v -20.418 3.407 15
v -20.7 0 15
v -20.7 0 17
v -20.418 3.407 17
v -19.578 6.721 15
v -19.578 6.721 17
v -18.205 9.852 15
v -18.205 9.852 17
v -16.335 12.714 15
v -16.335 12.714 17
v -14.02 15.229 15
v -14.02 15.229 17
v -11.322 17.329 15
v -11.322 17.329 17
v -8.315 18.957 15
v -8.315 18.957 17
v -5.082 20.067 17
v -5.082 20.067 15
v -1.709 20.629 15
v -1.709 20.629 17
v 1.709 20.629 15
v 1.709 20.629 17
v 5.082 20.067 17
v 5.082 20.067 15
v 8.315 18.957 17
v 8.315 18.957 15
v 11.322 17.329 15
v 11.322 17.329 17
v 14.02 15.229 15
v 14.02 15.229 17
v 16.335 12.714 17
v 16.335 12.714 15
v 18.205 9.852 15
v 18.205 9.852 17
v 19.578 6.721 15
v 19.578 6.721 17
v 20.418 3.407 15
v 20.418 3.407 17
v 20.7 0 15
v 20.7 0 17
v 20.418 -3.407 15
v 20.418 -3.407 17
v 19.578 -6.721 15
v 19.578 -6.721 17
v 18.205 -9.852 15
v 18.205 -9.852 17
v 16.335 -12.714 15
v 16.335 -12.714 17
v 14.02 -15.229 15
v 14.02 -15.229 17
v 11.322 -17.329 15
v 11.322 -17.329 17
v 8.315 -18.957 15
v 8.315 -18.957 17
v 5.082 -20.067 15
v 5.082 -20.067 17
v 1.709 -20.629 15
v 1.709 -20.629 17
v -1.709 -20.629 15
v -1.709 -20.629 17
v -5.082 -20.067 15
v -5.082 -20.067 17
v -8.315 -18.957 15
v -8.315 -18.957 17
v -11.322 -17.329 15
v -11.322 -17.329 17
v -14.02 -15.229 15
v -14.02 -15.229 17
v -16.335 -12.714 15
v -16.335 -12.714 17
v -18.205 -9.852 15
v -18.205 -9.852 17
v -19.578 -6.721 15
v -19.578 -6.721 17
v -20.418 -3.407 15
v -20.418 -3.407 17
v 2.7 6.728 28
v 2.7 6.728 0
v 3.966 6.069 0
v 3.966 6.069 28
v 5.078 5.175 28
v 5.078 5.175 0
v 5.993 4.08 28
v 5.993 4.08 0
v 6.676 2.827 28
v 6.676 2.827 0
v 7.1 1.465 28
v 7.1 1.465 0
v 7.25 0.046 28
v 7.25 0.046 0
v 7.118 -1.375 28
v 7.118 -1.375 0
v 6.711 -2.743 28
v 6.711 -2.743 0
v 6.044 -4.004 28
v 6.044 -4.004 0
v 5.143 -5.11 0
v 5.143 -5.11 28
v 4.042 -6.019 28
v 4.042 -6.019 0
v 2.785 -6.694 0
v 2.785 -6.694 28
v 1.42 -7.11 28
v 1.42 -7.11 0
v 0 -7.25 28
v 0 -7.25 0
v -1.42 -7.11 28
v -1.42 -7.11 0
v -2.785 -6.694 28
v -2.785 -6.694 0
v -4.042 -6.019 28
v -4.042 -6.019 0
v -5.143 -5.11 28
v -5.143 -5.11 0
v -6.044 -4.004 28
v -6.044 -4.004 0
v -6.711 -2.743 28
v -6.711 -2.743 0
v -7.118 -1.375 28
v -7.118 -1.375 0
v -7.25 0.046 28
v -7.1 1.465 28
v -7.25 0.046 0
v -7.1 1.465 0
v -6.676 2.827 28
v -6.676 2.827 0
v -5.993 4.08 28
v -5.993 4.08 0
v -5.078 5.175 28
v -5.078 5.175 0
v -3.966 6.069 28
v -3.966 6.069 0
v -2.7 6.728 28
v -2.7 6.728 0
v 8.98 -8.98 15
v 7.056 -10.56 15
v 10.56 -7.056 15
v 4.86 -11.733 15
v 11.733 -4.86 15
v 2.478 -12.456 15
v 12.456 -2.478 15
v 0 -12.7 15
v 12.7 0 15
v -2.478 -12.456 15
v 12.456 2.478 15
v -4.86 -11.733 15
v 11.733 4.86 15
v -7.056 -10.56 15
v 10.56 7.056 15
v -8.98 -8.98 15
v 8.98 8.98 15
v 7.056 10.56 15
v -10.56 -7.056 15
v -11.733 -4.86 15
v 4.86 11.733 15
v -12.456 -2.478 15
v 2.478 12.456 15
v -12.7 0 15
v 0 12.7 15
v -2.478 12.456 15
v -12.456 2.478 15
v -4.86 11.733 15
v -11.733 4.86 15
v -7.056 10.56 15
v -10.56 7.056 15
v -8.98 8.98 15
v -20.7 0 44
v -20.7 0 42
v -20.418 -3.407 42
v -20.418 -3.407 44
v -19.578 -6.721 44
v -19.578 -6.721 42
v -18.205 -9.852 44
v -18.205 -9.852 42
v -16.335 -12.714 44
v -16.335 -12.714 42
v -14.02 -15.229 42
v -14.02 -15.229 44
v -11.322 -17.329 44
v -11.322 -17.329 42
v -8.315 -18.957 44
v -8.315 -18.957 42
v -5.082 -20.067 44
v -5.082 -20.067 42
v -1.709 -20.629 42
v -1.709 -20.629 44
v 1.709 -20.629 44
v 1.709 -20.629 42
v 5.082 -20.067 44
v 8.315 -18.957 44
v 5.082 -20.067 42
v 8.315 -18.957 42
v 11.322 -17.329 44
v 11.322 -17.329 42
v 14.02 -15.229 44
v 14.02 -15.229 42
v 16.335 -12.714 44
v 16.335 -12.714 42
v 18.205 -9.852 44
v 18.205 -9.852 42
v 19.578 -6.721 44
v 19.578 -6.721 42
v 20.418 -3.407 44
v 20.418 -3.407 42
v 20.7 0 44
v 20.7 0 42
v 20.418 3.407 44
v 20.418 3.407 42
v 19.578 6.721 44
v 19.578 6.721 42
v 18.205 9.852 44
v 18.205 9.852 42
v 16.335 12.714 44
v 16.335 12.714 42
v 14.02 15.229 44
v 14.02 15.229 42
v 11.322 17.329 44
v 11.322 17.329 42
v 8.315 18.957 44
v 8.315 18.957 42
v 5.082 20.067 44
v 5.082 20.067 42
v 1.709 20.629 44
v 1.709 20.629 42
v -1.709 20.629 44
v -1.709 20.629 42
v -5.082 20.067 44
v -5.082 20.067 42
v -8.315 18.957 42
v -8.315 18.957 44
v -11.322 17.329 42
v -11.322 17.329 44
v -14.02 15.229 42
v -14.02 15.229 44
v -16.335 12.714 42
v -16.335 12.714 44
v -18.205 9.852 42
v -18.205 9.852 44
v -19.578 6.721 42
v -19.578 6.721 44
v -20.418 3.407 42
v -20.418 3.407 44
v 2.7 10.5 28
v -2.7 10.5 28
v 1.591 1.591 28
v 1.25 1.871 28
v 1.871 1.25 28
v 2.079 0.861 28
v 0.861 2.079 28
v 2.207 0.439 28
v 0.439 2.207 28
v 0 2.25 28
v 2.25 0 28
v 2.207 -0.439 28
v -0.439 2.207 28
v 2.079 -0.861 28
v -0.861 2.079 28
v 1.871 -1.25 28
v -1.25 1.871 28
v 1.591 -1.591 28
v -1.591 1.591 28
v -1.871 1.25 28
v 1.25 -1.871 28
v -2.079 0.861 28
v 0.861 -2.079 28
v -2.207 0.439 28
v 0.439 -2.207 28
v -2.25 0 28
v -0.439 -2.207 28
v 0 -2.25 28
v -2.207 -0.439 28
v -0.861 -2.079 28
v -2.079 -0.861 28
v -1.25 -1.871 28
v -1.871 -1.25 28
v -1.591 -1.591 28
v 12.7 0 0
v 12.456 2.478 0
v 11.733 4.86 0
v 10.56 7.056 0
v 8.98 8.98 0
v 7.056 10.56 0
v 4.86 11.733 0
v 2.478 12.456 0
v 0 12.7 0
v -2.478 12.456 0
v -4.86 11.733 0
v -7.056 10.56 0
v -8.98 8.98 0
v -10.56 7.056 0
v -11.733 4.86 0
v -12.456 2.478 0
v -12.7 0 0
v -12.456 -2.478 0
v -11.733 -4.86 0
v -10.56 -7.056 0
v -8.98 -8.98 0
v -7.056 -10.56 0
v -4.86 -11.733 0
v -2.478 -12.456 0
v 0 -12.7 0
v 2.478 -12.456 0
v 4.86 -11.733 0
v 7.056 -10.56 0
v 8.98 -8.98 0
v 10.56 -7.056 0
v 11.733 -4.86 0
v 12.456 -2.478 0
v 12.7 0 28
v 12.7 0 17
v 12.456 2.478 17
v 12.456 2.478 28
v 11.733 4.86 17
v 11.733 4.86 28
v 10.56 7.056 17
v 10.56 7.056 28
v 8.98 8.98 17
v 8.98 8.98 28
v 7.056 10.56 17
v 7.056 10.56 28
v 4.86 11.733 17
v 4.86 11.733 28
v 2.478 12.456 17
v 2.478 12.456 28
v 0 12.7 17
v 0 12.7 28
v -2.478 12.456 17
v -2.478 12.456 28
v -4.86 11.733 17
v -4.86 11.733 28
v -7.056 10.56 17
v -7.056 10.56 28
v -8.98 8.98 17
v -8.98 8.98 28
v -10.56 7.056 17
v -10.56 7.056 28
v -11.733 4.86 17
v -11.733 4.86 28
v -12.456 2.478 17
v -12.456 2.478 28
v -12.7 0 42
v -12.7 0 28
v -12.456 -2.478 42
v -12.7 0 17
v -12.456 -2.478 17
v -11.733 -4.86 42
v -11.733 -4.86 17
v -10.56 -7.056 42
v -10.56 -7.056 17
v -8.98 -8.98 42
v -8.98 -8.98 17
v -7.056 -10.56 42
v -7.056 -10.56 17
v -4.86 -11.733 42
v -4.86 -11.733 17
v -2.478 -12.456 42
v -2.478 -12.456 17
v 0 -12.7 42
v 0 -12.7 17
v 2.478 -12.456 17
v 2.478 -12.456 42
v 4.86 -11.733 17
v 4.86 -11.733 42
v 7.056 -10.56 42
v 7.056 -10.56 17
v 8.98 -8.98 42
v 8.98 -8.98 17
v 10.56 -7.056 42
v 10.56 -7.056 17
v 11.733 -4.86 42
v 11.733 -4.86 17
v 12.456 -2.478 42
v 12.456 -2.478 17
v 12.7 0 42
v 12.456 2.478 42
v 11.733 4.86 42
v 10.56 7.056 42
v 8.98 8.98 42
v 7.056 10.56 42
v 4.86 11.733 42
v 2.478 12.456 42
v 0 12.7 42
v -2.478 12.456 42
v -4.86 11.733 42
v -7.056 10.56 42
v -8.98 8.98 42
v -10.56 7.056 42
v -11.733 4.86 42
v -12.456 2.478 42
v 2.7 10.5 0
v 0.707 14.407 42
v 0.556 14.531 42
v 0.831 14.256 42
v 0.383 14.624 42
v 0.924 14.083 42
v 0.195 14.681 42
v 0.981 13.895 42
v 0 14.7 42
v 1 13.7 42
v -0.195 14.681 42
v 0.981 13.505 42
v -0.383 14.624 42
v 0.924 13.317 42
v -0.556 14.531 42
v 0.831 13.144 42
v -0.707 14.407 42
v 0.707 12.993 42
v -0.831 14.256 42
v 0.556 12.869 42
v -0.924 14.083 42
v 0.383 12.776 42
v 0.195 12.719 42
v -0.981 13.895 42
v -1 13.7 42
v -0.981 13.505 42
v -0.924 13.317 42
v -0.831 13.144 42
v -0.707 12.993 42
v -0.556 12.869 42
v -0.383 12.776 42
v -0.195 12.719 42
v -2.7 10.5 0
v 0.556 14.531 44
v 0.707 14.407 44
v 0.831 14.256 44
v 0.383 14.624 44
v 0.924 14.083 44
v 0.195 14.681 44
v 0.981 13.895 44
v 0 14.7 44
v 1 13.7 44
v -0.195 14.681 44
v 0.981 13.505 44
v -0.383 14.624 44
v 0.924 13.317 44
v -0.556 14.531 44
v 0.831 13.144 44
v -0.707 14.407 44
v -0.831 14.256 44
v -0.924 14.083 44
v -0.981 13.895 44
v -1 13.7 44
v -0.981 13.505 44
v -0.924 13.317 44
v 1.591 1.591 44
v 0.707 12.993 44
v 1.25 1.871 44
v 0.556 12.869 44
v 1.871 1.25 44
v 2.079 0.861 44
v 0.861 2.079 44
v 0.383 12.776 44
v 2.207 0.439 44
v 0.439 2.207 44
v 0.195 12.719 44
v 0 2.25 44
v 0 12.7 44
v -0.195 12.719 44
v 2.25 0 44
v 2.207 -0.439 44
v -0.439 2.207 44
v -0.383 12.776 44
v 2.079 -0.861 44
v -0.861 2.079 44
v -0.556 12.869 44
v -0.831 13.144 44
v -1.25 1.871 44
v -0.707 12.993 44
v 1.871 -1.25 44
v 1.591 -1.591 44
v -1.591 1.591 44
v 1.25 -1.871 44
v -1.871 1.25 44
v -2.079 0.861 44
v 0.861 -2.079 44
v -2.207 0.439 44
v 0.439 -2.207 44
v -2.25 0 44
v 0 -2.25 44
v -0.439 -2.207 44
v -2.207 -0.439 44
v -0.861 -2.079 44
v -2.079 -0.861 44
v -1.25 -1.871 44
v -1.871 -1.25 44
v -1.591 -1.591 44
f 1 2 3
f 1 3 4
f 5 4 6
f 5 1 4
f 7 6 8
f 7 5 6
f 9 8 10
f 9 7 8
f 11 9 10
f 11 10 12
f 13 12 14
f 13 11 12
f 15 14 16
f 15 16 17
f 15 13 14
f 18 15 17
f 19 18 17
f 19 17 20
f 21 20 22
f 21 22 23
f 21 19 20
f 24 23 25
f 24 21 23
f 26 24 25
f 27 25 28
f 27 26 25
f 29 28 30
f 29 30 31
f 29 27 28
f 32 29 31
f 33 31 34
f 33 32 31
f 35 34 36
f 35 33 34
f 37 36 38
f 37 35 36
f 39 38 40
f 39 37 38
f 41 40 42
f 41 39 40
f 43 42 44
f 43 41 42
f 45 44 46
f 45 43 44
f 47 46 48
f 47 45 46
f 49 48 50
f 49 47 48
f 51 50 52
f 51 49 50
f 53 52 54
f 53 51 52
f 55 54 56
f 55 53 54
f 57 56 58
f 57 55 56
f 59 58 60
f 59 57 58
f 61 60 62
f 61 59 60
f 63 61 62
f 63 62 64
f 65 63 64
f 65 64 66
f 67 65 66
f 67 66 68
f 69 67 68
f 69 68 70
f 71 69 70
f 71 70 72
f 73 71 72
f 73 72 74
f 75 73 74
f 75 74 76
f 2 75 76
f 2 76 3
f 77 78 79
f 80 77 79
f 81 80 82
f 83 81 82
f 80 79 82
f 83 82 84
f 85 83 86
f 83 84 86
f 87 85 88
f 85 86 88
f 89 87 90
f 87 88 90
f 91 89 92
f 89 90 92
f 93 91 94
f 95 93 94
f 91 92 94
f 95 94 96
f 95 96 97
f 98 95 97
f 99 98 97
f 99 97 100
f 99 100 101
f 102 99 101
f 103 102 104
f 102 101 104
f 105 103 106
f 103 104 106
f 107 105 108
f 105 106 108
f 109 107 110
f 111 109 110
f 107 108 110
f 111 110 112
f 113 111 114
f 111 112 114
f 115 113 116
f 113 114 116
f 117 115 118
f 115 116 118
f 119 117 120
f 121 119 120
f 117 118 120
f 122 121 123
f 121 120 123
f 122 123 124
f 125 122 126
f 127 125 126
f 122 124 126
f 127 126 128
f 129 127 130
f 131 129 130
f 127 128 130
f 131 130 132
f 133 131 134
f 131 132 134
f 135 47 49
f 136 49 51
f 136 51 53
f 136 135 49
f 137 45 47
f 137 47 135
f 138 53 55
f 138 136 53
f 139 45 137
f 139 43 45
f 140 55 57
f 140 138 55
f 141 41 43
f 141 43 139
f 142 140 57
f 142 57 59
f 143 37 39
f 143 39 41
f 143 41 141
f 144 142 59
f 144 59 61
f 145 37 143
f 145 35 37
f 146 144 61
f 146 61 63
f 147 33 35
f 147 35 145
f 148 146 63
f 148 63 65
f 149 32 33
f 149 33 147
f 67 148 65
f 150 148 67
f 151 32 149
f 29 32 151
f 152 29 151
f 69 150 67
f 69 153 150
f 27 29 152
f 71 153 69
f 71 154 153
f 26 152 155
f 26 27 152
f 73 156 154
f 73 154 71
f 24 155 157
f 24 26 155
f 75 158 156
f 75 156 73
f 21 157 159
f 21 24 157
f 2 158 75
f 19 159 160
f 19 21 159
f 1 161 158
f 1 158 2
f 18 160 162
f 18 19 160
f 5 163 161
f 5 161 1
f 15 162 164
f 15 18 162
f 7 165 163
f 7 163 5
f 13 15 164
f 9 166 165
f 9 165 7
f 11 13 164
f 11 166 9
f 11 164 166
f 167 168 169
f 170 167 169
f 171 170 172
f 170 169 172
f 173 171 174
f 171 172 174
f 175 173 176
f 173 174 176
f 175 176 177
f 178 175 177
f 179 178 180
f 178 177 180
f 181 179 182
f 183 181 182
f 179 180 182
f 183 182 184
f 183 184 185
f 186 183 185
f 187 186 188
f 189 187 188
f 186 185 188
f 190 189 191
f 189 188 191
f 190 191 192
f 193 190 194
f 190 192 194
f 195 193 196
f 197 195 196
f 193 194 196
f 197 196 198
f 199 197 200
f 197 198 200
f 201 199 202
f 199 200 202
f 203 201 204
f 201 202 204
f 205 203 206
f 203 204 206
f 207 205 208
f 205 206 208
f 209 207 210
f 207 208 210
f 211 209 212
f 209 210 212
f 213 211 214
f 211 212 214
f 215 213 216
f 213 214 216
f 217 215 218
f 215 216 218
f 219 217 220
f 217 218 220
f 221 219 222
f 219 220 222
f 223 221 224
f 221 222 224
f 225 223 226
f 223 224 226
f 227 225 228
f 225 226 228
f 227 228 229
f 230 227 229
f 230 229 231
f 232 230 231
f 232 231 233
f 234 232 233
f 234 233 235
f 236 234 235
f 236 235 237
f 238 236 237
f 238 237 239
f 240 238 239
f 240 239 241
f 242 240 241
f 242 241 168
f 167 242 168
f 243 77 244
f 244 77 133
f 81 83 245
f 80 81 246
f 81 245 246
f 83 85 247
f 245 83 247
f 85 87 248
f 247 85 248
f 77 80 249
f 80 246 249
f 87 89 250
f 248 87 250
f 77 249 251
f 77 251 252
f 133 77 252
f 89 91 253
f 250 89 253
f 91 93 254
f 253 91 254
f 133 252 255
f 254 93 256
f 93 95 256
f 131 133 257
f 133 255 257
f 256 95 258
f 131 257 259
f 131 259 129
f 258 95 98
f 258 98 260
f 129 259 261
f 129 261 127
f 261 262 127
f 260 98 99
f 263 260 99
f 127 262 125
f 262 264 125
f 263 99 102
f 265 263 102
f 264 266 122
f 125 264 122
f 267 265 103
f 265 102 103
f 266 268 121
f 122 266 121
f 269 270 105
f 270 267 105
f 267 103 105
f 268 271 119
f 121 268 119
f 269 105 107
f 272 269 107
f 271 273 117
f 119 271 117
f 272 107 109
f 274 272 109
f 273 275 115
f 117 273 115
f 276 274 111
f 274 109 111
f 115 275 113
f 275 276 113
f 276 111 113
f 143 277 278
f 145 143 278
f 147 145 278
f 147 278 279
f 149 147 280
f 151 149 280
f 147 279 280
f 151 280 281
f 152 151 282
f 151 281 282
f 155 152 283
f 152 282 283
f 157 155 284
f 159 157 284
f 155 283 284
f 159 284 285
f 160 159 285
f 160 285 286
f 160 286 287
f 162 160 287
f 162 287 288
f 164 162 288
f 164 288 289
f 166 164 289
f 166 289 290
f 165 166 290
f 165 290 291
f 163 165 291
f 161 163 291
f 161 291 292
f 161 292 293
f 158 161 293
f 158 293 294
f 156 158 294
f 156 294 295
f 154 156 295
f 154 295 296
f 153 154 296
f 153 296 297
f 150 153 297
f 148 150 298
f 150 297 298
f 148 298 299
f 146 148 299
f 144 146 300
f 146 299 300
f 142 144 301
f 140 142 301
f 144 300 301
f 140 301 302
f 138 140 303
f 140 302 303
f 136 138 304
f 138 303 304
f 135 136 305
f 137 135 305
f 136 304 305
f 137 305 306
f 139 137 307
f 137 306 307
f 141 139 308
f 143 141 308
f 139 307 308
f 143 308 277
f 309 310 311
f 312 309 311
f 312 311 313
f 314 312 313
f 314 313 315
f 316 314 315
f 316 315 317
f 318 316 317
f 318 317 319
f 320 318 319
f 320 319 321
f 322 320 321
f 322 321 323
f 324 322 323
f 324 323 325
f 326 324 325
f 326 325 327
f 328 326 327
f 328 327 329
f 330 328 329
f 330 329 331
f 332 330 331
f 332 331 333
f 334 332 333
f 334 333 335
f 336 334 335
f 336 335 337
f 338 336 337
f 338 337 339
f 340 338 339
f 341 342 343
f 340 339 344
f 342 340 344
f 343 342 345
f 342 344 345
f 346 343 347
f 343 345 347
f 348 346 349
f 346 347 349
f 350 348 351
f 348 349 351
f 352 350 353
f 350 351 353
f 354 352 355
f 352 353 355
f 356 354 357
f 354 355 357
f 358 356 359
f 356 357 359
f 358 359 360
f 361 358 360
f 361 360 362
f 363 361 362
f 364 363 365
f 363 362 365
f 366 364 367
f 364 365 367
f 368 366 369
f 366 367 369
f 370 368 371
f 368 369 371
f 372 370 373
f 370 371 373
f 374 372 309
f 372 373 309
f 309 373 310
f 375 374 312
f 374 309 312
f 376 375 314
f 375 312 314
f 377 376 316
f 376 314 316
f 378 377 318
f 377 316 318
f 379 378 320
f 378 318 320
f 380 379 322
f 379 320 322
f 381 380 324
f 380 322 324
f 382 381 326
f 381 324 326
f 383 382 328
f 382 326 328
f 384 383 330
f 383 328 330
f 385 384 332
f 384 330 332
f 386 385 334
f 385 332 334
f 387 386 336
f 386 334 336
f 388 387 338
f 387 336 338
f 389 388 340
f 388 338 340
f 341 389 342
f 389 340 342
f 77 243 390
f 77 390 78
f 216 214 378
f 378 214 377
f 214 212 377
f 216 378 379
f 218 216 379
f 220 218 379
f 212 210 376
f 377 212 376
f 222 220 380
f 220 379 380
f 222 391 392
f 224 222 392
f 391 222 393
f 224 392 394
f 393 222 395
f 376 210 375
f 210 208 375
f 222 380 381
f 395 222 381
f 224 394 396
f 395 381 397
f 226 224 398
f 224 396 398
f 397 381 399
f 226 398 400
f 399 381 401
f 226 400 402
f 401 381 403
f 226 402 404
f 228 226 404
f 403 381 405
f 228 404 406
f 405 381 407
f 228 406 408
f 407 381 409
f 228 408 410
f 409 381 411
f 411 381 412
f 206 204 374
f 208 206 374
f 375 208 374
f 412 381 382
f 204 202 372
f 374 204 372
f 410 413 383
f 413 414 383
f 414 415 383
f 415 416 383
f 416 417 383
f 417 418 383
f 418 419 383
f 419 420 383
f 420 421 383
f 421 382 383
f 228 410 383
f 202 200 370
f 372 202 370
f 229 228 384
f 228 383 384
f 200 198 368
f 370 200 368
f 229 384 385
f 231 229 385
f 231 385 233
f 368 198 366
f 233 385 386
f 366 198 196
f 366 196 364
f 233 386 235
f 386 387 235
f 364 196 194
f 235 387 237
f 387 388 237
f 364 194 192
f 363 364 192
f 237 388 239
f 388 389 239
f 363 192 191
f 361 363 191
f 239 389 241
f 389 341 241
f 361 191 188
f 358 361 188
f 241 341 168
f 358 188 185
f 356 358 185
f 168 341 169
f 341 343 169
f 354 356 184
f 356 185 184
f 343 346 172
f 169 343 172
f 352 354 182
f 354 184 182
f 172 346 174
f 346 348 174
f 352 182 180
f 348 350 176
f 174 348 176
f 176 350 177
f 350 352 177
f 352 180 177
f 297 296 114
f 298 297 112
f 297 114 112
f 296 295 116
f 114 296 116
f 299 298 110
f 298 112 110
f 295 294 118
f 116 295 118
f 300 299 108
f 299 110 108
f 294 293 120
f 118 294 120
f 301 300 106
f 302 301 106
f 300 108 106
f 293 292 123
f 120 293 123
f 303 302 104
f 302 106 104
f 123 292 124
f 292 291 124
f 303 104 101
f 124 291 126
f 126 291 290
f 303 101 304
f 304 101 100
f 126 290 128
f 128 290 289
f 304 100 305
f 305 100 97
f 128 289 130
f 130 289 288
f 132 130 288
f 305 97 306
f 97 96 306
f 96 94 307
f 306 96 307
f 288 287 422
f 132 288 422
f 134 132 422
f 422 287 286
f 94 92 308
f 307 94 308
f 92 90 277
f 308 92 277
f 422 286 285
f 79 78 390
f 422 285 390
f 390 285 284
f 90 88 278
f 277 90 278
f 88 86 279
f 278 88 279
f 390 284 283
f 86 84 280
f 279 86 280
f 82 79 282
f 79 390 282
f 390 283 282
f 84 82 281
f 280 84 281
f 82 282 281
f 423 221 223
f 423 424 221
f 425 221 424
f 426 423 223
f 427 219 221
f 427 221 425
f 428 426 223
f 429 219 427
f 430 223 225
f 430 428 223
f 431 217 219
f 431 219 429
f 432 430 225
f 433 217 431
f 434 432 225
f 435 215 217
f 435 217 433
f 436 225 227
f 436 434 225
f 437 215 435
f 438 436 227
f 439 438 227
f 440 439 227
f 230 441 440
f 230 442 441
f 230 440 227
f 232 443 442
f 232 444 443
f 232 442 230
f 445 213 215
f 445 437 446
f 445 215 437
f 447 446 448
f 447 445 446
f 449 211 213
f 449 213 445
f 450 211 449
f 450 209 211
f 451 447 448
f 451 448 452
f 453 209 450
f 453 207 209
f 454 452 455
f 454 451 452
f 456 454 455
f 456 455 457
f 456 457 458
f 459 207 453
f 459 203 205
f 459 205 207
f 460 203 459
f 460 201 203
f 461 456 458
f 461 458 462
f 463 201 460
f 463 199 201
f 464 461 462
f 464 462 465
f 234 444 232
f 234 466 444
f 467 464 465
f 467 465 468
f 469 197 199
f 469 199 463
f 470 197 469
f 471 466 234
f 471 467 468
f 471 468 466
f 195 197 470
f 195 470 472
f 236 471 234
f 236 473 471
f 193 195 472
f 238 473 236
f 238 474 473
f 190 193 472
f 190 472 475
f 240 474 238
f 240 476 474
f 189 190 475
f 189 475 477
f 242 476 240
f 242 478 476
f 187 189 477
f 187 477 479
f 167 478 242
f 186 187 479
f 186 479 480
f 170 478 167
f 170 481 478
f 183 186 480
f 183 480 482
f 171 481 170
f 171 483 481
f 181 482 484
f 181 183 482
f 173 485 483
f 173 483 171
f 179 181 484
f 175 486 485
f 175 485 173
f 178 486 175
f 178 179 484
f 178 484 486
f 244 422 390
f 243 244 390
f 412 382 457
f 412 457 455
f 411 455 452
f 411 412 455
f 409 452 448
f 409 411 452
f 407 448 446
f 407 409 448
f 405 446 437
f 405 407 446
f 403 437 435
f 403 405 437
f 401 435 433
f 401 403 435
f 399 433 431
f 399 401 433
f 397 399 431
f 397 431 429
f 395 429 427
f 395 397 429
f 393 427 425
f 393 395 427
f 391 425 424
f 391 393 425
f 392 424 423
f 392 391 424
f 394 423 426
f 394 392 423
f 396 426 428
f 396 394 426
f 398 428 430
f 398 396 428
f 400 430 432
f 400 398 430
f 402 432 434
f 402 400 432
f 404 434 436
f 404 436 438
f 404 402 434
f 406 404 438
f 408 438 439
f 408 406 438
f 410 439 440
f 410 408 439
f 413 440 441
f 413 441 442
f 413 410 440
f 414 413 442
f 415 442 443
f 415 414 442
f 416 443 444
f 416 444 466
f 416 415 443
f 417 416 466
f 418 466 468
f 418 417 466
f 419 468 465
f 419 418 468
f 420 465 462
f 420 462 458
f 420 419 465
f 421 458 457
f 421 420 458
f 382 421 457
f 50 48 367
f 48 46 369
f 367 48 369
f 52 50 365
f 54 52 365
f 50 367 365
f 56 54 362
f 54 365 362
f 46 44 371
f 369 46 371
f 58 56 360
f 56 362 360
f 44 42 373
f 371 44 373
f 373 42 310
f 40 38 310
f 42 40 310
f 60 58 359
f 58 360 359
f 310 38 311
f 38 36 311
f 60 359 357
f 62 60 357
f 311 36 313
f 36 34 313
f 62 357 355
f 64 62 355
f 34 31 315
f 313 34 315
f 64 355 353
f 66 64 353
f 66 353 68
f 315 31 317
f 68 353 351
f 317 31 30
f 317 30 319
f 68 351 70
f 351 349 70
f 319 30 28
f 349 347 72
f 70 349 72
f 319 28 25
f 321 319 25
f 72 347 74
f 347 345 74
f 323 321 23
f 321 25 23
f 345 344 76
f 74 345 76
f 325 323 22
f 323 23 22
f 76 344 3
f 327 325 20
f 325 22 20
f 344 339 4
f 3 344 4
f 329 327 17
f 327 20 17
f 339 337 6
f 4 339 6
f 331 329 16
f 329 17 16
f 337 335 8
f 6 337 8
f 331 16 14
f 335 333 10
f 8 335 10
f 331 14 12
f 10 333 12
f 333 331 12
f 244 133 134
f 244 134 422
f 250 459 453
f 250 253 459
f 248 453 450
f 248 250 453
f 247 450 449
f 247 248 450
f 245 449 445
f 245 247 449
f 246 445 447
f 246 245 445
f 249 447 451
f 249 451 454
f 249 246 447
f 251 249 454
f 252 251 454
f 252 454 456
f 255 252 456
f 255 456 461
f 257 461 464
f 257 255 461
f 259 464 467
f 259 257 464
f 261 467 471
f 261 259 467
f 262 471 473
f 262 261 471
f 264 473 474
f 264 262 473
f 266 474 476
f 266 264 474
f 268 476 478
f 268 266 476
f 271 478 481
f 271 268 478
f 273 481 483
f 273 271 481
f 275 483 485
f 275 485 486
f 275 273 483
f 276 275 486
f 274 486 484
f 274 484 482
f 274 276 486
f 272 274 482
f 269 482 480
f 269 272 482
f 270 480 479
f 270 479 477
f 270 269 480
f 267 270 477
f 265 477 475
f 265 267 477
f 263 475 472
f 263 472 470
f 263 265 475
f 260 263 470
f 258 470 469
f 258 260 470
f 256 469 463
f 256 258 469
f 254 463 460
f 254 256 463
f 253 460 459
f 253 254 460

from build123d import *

# Parameters (mm, degrees)
SKETCH1_R           = 12.7
BOSS_EXTRUDE1_DEPTH = 28
SKETCH3_R           = 20.7
SKETCH3_R_2         = 12.7
BOSS_EXTRUDE2_DEPTH = 2
SKETCH4_R           = 12.7
SKETCH4_R_2         = 2.25
BOSS_EXTRUDE3_DEPTH = 14
SKETCH5_R           = 20.7
SKETCH5_R_2         = 2.25
SKETCH5_R_3         = 1
BOSS_EXTRUDE4_DEPTH = 2


with BuildPart() as part:
    # Sketch1 → Boss-Extrude1 (new body)
    with BuildSketch(Plane.XY):
        Circle(SKETCH1_R)
        with BuildLine():
            Line((-2.7, 6.728484228), (-2.7, 10.5))
            Line((-2.7, 10.5), (2.7, 10.5))
            Line((2.7, 10.5), (2.7, 6.728484228))
            ThreePointArc((2.7, 6.728484228), (0, -7.25), (-2.7, 6.728484228))
        make_face(mode=Mode.SUBTRACT)
    extrude(amount=BOSS_EXTRUDE1_DEPTH)

    # Sketch3 → Boss-Extrude2 (add)
    with BuildSketch(Plane(origin=(0, 0, 15), x_dir=(-1, 0, 0), z_dir=(0, 0, -1))):
        Circle(SKETCH3_R)
        Circle(SKETCH3_R_2, mode=Mode.SUBTRACT)
    extrude(amount=-BOSS_EXTRUDE2_DEPTH)

    # Sketch4 → Boss-Extrude3 (add)
    with BuildSketch(Plane.XY.offset(28)):
        with Locations(Location((0, 0, 0), (0, 0, 180))):
            Circle(SKETCH4_R)
        Circle(SKETCH4_R_2, mode=Mode.SUBTRACT)
    extrude(amount=BOSS_EXTRUDE3_DEPTH)

    # Sketch5 → Boss-Extrude4 (add)
    with BuildSketch(Plane.XY.offset(42)):
        with Locations(Location((0, 0, 0), (0, 0, 180))):
            Circle(SKETCH5_R)
        Circle(SKETCH5_R_2, mode=Mode.SUBTRACT)
        with Locations(Location((0, 13.7, 0), (0, 0, 269.999219862))):
            Circle(SKETCH5_R_3, mode=Mode.SUBTRACT)
    extrude(amount=BOSS_EXTRUDE4_DEPTH)


solid = part.part
